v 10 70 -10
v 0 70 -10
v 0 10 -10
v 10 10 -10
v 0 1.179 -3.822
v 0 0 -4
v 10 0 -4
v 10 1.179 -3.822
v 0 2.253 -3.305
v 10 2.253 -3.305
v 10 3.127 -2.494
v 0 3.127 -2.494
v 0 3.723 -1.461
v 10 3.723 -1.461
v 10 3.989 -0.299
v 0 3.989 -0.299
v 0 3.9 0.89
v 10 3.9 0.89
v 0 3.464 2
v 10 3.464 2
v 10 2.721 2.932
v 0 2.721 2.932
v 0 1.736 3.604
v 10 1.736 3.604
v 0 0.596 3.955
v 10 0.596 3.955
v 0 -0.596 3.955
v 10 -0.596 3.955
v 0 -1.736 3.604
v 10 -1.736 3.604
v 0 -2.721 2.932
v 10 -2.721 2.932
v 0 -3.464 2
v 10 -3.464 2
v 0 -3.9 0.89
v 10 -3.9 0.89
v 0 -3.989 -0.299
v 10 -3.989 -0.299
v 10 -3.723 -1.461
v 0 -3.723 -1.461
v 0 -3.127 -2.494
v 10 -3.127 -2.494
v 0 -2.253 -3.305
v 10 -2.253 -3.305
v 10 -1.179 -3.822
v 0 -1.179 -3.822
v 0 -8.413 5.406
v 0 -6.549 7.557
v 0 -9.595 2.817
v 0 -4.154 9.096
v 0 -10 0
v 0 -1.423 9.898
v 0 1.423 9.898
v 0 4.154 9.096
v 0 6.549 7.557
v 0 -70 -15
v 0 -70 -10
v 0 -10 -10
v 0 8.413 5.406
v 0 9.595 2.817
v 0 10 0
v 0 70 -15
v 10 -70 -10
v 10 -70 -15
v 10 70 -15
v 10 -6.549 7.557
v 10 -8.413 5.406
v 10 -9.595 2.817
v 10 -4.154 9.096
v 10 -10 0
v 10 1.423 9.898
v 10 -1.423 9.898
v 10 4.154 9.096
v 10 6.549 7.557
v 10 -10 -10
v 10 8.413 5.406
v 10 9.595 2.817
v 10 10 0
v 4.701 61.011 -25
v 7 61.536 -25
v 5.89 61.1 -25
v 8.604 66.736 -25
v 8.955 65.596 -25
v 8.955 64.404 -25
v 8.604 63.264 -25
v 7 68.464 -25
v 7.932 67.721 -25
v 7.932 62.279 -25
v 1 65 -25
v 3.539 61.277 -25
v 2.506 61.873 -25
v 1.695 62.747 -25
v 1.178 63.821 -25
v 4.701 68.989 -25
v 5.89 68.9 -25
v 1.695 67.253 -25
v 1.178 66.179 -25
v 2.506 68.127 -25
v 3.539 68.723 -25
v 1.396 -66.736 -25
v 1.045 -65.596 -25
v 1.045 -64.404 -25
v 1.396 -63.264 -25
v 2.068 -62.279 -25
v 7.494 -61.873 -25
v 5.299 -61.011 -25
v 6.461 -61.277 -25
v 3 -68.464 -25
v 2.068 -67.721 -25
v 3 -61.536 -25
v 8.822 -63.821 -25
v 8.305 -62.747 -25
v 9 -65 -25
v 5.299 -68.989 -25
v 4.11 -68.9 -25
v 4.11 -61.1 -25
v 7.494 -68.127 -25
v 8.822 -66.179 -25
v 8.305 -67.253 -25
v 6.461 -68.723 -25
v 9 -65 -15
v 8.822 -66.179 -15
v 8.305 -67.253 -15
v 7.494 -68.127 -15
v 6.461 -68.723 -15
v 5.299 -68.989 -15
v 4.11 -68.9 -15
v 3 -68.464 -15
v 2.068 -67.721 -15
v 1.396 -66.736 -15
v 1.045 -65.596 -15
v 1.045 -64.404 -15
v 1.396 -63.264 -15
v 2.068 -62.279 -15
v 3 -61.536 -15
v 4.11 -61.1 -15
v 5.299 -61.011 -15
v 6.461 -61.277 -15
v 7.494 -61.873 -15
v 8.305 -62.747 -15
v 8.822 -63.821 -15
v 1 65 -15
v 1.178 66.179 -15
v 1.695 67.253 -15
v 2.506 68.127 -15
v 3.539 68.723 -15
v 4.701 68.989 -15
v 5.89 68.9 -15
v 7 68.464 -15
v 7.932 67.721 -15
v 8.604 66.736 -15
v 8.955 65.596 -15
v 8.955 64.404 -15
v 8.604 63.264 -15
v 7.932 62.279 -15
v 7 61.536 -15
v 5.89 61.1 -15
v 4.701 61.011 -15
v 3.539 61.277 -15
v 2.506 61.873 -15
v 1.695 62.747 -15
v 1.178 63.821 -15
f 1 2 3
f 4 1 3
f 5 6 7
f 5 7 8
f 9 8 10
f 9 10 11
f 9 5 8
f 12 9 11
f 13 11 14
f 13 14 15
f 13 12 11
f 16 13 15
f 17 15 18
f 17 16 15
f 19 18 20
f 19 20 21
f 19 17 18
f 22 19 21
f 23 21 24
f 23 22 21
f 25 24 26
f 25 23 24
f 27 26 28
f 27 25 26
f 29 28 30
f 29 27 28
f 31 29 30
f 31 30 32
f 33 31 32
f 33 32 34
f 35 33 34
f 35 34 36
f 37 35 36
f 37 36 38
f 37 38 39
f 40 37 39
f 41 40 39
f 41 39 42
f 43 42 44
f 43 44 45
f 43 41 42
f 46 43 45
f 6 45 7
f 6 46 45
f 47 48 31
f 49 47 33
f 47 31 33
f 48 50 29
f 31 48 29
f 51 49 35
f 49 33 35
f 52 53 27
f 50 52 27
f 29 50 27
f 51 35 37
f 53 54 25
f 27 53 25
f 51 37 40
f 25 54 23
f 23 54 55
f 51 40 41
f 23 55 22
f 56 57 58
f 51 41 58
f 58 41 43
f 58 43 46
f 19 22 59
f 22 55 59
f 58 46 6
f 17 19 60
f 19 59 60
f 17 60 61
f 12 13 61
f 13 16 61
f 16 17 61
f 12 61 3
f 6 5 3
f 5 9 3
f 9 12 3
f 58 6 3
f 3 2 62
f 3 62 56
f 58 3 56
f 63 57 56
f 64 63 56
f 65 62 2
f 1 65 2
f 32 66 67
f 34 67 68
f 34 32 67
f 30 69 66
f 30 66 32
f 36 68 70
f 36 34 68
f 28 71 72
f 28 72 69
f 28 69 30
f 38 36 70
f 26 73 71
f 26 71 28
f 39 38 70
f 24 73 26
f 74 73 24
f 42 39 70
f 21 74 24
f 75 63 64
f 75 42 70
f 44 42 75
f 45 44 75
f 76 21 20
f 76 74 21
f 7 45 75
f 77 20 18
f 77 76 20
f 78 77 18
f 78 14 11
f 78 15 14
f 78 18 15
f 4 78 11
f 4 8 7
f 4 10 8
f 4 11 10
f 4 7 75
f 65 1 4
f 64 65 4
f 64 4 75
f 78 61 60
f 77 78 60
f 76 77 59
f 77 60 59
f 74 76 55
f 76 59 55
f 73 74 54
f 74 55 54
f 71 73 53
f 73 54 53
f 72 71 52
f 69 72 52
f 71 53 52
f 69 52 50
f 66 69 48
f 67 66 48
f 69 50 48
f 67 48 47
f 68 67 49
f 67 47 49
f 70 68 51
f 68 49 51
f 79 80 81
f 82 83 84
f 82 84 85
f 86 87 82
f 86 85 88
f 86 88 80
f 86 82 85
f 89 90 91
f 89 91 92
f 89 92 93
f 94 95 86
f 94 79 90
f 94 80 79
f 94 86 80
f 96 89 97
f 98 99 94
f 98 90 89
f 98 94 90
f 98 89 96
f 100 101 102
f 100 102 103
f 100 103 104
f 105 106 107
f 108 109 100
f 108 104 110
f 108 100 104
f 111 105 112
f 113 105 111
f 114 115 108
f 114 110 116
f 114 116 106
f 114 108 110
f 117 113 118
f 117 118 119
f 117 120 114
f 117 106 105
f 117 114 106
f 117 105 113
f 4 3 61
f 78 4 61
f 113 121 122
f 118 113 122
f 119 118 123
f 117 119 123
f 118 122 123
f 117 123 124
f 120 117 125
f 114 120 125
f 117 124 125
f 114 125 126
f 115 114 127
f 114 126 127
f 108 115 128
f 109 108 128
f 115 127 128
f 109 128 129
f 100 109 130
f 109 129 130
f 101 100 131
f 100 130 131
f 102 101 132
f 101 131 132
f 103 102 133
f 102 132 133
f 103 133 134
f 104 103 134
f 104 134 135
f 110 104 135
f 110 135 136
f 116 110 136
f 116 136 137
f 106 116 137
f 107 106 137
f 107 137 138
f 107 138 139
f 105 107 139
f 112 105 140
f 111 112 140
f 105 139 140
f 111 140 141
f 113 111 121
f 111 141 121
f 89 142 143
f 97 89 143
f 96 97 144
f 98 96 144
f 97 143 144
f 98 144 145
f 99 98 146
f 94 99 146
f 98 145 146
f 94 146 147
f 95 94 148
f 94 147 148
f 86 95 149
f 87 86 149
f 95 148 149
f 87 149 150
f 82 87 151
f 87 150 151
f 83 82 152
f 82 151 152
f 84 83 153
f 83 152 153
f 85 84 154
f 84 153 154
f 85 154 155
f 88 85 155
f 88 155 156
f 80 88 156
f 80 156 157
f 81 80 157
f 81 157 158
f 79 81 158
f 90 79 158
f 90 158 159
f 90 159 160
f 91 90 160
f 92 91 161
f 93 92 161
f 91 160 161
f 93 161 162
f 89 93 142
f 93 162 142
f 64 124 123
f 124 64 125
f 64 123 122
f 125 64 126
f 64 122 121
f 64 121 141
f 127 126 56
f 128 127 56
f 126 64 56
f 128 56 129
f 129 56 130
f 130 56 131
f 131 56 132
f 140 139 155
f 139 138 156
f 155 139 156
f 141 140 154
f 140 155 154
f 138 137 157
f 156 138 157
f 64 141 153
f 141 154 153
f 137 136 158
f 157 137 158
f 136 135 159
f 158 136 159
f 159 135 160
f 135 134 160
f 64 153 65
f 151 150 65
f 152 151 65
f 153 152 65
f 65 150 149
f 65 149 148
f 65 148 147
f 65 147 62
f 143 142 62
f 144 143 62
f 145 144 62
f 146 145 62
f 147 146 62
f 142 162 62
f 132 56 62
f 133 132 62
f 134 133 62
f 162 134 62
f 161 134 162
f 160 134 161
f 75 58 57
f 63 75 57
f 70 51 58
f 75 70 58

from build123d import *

# Parameters (mm, degrees)
SKETCH1_R           = 4
BOSS_EXTRUDE1_DEPTH = 10
SKETCH2_R           = 4
BOSS_EXTRUDE2_DEPTH = 10


with BuildPart() as part:
    # Sketch1 → Boss-Extrude1 (new body)
    with BuildSketch(Plane(origin=(0, 0, 0), x_dir=(0, 0, -1), z_dir=(1, 0, 0))):
        with BuildLine():
            Line((10, 70), (10, 10))
            Line((10, 10), (0, 10))
            ThreePointArc((0, 10), (-10, 0), (0, -10))
            Line((0, -10), (10, -10))
            Line((10, -10), (10, -70))
            Line((10, -70), (15, -70))
            Line((15, -70), (15, 70))
            Line((15, 70), (10, 70))
        make_face()
        Circle(SKETCH1_R, mode=Mode.SUBTRACT)
    extrude(amount=BOSS_EXTRUDE1_DEPTH)

    # Sketch2 → Boss-Extrude2 (add)
    with BuildSketch(Plane(origin=(0, 0, -15), x_dir=(-1, 0, 0), z_dir=(0, 0, -1))):
        with Locations((-5, 65)):
            Circle(SKETCH2_R)
        with Locations(Location((-5, -65, 0), (0, 0, 180))):
            Circle(SKETCH2_R)
    extrude(amount=BOSS_EXTRUDE2_DEPTH)


solid = part.part
